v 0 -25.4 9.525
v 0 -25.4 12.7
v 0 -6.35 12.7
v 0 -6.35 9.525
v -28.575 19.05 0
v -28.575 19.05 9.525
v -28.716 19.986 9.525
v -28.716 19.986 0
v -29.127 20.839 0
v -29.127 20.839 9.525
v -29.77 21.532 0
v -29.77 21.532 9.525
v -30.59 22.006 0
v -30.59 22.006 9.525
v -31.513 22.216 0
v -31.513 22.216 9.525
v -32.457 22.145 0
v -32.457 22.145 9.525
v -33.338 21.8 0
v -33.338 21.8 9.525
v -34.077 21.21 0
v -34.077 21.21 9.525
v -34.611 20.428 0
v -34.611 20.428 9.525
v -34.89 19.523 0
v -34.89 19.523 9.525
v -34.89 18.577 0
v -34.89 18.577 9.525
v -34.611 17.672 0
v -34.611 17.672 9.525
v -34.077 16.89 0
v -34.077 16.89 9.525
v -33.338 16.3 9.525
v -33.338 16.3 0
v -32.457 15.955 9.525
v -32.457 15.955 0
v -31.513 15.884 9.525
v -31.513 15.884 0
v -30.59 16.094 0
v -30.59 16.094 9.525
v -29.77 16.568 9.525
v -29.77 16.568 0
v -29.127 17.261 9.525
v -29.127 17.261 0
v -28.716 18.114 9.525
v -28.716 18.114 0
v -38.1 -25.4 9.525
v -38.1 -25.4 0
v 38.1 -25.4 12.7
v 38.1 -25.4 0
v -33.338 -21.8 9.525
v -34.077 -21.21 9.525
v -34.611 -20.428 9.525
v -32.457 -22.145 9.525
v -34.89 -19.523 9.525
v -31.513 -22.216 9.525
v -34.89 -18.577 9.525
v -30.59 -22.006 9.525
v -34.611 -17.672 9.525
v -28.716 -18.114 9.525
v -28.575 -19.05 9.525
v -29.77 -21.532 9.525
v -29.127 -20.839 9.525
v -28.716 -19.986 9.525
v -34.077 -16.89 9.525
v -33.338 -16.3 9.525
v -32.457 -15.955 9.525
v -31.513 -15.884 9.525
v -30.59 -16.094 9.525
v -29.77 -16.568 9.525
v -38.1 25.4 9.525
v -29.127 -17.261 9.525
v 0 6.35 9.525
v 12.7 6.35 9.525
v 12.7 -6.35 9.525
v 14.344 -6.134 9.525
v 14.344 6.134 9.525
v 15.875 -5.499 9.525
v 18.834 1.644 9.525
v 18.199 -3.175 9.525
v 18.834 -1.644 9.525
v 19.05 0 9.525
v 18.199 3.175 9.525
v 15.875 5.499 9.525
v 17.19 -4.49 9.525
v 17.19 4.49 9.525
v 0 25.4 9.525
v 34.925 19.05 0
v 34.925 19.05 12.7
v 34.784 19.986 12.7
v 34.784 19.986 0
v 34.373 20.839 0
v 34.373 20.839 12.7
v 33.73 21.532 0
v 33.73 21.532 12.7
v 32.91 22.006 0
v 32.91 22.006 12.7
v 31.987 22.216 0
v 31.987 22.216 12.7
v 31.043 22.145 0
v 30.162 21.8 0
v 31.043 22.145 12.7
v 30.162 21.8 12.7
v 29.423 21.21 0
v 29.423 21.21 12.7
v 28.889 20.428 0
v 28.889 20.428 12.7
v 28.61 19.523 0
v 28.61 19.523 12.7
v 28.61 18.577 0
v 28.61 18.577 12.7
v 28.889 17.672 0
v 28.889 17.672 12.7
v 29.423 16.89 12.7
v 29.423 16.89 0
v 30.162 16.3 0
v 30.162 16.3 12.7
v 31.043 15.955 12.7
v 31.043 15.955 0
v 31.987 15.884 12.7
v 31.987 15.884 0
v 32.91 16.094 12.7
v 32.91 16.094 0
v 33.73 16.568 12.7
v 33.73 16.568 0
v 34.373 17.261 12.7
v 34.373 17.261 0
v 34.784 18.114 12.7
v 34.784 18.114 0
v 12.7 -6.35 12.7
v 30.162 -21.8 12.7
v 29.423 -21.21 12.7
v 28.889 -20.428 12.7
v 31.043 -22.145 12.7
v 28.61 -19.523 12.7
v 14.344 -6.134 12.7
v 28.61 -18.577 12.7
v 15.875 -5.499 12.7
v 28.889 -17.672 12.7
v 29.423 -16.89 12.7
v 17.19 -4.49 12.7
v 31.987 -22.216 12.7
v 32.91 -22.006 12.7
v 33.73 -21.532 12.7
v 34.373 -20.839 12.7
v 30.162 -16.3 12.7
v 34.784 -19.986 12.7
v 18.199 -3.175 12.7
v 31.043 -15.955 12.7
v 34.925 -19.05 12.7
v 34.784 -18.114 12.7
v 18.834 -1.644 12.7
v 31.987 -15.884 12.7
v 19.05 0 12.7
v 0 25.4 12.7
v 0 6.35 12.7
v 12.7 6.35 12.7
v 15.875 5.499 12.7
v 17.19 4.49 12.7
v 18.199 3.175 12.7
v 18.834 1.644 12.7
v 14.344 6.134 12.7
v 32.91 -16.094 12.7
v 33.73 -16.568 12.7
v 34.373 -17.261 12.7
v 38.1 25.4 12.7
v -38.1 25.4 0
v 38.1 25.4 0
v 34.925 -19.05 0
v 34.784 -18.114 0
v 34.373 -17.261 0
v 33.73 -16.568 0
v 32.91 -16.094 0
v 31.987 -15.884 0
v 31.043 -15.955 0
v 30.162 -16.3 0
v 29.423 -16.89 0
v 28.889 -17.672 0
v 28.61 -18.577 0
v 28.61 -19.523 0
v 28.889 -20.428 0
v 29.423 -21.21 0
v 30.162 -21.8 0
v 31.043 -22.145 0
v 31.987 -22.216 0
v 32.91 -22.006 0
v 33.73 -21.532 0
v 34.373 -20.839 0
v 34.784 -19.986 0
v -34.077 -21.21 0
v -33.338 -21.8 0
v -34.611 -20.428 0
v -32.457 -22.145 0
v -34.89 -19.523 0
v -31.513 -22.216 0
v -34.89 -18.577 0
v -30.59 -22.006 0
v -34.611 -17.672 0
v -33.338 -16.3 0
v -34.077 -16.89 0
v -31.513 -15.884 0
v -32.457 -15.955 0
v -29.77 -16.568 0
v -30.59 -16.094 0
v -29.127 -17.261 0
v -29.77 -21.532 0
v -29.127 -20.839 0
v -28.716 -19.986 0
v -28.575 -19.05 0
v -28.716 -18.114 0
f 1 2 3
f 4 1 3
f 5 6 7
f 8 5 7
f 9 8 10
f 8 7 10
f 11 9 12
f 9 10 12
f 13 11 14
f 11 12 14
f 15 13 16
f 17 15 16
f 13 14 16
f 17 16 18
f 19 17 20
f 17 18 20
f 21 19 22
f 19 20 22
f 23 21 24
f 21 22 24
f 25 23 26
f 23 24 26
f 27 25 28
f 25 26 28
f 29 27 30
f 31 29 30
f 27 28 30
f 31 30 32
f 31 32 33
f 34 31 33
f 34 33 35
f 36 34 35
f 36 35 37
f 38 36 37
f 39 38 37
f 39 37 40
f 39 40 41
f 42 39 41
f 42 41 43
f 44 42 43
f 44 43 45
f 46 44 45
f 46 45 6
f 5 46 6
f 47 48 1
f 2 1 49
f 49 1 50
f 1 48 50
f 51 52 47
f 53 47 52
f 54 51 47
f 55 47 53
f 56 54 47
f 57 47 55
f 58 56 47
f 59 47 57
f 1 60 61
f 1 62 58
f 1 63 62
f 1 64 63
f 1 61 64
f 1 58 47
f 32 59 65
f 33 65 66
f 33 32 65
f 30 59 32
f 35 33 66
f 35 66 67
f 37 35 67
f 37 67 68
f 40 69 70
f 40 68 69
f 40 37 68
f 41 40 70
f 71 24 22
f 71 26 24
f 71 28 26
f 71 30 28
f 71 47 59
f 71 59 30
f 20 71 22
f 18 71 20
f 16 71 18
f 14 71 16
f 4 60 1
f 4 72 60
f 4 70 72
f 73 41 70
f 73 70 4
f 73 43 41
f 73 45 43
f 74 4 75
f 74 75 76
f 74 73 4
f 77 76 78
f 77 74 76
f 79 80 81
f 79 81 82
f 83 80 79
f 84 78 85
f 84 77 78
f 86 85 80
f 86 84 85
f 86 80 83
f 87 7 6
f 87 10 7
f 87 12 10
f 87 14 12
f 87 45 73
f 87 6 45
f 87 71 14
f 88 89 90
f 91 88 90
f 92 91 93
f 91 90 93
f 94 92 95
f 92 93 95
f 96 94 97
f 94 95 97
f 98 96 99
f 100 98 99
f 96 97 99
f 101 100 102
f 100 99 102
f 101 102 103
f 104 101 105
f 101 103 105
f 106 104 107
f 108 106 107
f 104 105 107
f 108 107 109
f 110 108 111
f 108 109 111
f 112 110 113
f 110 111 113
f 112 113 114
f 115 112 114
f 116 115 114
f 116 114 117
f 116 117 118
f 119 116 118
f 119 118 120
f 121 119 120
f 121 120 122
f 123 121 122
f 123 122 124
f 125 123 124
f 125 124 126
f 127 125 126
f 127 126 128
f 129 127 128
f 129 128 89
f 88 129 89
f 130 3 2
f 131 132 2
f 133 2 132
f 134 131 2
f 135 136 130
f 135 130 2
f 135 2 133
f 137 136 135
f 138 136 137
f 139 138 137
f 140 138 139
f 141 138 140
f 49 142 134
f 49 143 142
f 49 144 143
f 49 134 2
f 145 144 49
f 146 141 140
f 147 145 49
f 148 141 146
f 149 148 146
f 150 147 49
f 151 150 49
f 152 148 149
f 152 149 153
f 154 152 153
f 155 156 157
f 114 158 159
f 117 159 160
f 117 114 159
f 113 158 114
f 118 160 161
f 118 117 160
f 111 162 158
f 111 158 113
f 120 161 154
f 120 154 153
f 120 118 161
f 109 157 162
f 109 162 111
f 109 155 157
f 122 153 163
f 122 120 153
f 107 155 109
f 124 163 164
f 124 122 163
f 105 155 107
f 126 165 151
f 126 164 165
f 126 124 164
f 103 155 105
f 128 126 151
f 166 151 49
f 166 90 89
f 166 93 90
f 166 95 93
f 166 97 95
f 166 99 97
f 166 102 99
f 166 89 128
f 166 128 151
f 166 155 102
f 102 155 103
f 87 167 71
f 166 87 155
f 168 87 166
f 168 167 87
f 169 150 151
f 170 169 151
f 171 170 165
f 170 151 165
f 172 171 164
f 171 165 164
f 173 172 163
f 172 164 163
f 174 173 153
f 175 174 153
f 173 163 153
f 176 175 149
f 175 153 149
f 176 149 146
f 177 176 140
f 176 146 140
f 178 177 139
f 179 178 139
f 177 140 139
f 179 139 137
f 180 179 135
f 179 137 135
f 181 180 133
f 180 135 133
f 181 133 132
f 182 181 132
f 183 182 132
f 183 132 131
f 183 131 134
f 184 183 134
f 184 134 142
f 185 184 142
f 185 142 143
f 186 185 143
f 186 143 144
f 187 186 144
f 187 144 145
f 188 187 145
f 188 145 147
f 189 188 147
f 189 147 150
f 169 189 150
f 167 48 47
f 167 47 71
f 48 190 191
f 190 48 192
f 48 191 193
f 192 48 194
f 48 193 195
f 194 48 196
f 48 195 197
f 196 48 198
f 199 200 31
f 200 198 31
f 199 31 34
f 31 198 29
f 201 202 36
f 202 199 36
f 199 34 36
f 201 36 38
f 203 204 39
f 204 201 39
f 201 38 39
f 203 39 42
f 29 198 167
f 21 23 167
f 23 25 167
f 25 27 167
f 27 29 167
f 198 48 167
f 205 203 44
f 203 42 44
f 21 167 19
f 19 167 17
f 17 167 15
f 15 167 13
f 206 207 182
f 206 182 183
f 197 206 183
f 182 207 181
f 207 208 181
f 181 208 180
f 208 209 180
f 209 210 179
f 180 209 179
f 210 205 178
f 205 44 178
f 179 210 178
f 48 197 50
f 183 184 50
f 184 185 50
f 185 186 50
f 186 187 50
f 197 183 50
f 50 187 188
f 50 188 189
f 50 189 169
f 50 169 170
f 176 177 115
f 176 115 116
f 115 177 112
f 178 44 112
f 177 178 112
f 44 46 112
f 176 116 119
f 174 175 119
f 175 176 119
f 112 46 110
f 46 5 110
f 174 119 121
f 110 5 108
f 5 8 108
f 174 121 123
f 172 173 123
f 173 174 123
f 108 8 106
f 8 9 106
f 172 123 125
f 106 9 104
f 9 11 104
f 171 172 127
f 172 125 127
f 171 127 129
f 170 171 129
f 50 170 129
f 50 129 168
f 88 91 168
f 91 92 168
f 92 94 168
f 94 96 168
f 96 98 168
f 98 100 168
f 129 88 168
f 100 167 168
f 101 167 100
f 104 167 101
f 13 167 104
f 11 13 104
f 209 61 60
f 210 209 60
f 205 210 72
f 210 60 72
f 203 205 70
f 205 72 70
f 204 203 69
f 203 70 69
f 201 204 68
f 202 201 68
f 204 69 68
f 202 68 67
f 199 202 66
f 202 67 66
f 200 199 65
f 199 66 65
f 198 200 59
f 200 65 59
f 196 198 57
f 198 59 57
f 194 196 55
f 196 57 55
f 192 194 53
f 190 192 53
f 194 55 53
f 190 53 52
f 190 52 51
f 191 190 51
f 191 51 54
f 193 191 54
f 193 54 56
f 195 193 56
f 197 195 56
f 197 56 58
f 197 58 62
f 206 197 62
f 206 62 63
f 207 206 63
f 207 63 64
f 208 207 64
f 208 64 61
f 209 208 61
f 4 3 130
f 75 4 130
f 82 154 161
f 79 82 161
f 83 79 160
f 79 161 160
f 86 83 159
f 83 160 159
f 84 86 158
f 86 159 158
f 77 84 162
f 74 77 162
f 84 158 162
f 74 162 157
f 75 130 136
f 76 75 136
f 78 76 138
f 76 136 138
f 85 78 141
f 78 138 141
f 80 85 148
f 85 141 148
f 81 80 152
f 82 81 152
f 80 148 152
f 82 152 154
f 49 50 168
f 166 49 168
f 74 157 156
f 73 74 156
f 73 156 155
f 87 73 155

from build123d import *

# Parameters (mm, degrees)
F0_W     = 76.2
F0_H     = 50.8
F1_DEPTH = 12.7
F2_R     = 3.175
F3_DEPTH = 12.701
F5_DEPTH = 3.175
F6_W     = 38.1
F6_H     = 50.8
F7_DEPTH = 3.175


with BuildPart() as f1:
    # F0 (on Top) → F1 (new body)
    with BuildSketch(Plane.XY):
        Rectangle(F0_W, F0_H)
    extrude(amount=F1_DEPTH)

    # F2 (on face) → F3 (cut, through all)
    with BuildSketch(Plane.XY.offset(12.7)):
        with Locations((-31.75, 19.05)):
            Circle(F2_R)
        with Locations((31.75, 19.05)):
            Circle(F2_R)
        with Locations((31.75, -19.05)):
            Circle(F2_R)
        with Locations((-31.75, -19.05)):
            Circle(F2_R)
    extrude(amount=-F3_DEPTH, mode=Mode.SUBTRACT)

    # F4 (on face) → F5 (cut)
    with BuildSketch(Plane.XY.offset(12.7)):
        with BuildLine():
            Line((-12.7, -6.35), (12.7, -6.35))
            ThreePointArc((12.7, -6.35), (17.190128, -4.490128), (19.05, 0))
            ThreePointArc((19.05, 0), (17.190128, 4.490128), (12.7, 6.35))
            Line((12.7, 6.35), (-12.7, 6.35))
            ThreePointArc((-12.7, 6.35), (-17.190128, 4.490128), (-19.05, 0))
            ThreePointArc((-19.05, 0), (-17.190128, -4.490128), (-12.7, -6.35))
        make_face()
    extrude(amount=-F5_DEPTH, mode=Mode.SUBTRACT)

    # F6 (on face) → F7 (cut, through all)
    with BuildSketch(Plane.XY.offset(12.7)):
        with Locations((-19.05, 0)):
            Rectangle(F6_W, F6_H)
    extrude(amount=-F7_DEPTH, mode=Mode.SUBTRACT)


solid = f1.part
